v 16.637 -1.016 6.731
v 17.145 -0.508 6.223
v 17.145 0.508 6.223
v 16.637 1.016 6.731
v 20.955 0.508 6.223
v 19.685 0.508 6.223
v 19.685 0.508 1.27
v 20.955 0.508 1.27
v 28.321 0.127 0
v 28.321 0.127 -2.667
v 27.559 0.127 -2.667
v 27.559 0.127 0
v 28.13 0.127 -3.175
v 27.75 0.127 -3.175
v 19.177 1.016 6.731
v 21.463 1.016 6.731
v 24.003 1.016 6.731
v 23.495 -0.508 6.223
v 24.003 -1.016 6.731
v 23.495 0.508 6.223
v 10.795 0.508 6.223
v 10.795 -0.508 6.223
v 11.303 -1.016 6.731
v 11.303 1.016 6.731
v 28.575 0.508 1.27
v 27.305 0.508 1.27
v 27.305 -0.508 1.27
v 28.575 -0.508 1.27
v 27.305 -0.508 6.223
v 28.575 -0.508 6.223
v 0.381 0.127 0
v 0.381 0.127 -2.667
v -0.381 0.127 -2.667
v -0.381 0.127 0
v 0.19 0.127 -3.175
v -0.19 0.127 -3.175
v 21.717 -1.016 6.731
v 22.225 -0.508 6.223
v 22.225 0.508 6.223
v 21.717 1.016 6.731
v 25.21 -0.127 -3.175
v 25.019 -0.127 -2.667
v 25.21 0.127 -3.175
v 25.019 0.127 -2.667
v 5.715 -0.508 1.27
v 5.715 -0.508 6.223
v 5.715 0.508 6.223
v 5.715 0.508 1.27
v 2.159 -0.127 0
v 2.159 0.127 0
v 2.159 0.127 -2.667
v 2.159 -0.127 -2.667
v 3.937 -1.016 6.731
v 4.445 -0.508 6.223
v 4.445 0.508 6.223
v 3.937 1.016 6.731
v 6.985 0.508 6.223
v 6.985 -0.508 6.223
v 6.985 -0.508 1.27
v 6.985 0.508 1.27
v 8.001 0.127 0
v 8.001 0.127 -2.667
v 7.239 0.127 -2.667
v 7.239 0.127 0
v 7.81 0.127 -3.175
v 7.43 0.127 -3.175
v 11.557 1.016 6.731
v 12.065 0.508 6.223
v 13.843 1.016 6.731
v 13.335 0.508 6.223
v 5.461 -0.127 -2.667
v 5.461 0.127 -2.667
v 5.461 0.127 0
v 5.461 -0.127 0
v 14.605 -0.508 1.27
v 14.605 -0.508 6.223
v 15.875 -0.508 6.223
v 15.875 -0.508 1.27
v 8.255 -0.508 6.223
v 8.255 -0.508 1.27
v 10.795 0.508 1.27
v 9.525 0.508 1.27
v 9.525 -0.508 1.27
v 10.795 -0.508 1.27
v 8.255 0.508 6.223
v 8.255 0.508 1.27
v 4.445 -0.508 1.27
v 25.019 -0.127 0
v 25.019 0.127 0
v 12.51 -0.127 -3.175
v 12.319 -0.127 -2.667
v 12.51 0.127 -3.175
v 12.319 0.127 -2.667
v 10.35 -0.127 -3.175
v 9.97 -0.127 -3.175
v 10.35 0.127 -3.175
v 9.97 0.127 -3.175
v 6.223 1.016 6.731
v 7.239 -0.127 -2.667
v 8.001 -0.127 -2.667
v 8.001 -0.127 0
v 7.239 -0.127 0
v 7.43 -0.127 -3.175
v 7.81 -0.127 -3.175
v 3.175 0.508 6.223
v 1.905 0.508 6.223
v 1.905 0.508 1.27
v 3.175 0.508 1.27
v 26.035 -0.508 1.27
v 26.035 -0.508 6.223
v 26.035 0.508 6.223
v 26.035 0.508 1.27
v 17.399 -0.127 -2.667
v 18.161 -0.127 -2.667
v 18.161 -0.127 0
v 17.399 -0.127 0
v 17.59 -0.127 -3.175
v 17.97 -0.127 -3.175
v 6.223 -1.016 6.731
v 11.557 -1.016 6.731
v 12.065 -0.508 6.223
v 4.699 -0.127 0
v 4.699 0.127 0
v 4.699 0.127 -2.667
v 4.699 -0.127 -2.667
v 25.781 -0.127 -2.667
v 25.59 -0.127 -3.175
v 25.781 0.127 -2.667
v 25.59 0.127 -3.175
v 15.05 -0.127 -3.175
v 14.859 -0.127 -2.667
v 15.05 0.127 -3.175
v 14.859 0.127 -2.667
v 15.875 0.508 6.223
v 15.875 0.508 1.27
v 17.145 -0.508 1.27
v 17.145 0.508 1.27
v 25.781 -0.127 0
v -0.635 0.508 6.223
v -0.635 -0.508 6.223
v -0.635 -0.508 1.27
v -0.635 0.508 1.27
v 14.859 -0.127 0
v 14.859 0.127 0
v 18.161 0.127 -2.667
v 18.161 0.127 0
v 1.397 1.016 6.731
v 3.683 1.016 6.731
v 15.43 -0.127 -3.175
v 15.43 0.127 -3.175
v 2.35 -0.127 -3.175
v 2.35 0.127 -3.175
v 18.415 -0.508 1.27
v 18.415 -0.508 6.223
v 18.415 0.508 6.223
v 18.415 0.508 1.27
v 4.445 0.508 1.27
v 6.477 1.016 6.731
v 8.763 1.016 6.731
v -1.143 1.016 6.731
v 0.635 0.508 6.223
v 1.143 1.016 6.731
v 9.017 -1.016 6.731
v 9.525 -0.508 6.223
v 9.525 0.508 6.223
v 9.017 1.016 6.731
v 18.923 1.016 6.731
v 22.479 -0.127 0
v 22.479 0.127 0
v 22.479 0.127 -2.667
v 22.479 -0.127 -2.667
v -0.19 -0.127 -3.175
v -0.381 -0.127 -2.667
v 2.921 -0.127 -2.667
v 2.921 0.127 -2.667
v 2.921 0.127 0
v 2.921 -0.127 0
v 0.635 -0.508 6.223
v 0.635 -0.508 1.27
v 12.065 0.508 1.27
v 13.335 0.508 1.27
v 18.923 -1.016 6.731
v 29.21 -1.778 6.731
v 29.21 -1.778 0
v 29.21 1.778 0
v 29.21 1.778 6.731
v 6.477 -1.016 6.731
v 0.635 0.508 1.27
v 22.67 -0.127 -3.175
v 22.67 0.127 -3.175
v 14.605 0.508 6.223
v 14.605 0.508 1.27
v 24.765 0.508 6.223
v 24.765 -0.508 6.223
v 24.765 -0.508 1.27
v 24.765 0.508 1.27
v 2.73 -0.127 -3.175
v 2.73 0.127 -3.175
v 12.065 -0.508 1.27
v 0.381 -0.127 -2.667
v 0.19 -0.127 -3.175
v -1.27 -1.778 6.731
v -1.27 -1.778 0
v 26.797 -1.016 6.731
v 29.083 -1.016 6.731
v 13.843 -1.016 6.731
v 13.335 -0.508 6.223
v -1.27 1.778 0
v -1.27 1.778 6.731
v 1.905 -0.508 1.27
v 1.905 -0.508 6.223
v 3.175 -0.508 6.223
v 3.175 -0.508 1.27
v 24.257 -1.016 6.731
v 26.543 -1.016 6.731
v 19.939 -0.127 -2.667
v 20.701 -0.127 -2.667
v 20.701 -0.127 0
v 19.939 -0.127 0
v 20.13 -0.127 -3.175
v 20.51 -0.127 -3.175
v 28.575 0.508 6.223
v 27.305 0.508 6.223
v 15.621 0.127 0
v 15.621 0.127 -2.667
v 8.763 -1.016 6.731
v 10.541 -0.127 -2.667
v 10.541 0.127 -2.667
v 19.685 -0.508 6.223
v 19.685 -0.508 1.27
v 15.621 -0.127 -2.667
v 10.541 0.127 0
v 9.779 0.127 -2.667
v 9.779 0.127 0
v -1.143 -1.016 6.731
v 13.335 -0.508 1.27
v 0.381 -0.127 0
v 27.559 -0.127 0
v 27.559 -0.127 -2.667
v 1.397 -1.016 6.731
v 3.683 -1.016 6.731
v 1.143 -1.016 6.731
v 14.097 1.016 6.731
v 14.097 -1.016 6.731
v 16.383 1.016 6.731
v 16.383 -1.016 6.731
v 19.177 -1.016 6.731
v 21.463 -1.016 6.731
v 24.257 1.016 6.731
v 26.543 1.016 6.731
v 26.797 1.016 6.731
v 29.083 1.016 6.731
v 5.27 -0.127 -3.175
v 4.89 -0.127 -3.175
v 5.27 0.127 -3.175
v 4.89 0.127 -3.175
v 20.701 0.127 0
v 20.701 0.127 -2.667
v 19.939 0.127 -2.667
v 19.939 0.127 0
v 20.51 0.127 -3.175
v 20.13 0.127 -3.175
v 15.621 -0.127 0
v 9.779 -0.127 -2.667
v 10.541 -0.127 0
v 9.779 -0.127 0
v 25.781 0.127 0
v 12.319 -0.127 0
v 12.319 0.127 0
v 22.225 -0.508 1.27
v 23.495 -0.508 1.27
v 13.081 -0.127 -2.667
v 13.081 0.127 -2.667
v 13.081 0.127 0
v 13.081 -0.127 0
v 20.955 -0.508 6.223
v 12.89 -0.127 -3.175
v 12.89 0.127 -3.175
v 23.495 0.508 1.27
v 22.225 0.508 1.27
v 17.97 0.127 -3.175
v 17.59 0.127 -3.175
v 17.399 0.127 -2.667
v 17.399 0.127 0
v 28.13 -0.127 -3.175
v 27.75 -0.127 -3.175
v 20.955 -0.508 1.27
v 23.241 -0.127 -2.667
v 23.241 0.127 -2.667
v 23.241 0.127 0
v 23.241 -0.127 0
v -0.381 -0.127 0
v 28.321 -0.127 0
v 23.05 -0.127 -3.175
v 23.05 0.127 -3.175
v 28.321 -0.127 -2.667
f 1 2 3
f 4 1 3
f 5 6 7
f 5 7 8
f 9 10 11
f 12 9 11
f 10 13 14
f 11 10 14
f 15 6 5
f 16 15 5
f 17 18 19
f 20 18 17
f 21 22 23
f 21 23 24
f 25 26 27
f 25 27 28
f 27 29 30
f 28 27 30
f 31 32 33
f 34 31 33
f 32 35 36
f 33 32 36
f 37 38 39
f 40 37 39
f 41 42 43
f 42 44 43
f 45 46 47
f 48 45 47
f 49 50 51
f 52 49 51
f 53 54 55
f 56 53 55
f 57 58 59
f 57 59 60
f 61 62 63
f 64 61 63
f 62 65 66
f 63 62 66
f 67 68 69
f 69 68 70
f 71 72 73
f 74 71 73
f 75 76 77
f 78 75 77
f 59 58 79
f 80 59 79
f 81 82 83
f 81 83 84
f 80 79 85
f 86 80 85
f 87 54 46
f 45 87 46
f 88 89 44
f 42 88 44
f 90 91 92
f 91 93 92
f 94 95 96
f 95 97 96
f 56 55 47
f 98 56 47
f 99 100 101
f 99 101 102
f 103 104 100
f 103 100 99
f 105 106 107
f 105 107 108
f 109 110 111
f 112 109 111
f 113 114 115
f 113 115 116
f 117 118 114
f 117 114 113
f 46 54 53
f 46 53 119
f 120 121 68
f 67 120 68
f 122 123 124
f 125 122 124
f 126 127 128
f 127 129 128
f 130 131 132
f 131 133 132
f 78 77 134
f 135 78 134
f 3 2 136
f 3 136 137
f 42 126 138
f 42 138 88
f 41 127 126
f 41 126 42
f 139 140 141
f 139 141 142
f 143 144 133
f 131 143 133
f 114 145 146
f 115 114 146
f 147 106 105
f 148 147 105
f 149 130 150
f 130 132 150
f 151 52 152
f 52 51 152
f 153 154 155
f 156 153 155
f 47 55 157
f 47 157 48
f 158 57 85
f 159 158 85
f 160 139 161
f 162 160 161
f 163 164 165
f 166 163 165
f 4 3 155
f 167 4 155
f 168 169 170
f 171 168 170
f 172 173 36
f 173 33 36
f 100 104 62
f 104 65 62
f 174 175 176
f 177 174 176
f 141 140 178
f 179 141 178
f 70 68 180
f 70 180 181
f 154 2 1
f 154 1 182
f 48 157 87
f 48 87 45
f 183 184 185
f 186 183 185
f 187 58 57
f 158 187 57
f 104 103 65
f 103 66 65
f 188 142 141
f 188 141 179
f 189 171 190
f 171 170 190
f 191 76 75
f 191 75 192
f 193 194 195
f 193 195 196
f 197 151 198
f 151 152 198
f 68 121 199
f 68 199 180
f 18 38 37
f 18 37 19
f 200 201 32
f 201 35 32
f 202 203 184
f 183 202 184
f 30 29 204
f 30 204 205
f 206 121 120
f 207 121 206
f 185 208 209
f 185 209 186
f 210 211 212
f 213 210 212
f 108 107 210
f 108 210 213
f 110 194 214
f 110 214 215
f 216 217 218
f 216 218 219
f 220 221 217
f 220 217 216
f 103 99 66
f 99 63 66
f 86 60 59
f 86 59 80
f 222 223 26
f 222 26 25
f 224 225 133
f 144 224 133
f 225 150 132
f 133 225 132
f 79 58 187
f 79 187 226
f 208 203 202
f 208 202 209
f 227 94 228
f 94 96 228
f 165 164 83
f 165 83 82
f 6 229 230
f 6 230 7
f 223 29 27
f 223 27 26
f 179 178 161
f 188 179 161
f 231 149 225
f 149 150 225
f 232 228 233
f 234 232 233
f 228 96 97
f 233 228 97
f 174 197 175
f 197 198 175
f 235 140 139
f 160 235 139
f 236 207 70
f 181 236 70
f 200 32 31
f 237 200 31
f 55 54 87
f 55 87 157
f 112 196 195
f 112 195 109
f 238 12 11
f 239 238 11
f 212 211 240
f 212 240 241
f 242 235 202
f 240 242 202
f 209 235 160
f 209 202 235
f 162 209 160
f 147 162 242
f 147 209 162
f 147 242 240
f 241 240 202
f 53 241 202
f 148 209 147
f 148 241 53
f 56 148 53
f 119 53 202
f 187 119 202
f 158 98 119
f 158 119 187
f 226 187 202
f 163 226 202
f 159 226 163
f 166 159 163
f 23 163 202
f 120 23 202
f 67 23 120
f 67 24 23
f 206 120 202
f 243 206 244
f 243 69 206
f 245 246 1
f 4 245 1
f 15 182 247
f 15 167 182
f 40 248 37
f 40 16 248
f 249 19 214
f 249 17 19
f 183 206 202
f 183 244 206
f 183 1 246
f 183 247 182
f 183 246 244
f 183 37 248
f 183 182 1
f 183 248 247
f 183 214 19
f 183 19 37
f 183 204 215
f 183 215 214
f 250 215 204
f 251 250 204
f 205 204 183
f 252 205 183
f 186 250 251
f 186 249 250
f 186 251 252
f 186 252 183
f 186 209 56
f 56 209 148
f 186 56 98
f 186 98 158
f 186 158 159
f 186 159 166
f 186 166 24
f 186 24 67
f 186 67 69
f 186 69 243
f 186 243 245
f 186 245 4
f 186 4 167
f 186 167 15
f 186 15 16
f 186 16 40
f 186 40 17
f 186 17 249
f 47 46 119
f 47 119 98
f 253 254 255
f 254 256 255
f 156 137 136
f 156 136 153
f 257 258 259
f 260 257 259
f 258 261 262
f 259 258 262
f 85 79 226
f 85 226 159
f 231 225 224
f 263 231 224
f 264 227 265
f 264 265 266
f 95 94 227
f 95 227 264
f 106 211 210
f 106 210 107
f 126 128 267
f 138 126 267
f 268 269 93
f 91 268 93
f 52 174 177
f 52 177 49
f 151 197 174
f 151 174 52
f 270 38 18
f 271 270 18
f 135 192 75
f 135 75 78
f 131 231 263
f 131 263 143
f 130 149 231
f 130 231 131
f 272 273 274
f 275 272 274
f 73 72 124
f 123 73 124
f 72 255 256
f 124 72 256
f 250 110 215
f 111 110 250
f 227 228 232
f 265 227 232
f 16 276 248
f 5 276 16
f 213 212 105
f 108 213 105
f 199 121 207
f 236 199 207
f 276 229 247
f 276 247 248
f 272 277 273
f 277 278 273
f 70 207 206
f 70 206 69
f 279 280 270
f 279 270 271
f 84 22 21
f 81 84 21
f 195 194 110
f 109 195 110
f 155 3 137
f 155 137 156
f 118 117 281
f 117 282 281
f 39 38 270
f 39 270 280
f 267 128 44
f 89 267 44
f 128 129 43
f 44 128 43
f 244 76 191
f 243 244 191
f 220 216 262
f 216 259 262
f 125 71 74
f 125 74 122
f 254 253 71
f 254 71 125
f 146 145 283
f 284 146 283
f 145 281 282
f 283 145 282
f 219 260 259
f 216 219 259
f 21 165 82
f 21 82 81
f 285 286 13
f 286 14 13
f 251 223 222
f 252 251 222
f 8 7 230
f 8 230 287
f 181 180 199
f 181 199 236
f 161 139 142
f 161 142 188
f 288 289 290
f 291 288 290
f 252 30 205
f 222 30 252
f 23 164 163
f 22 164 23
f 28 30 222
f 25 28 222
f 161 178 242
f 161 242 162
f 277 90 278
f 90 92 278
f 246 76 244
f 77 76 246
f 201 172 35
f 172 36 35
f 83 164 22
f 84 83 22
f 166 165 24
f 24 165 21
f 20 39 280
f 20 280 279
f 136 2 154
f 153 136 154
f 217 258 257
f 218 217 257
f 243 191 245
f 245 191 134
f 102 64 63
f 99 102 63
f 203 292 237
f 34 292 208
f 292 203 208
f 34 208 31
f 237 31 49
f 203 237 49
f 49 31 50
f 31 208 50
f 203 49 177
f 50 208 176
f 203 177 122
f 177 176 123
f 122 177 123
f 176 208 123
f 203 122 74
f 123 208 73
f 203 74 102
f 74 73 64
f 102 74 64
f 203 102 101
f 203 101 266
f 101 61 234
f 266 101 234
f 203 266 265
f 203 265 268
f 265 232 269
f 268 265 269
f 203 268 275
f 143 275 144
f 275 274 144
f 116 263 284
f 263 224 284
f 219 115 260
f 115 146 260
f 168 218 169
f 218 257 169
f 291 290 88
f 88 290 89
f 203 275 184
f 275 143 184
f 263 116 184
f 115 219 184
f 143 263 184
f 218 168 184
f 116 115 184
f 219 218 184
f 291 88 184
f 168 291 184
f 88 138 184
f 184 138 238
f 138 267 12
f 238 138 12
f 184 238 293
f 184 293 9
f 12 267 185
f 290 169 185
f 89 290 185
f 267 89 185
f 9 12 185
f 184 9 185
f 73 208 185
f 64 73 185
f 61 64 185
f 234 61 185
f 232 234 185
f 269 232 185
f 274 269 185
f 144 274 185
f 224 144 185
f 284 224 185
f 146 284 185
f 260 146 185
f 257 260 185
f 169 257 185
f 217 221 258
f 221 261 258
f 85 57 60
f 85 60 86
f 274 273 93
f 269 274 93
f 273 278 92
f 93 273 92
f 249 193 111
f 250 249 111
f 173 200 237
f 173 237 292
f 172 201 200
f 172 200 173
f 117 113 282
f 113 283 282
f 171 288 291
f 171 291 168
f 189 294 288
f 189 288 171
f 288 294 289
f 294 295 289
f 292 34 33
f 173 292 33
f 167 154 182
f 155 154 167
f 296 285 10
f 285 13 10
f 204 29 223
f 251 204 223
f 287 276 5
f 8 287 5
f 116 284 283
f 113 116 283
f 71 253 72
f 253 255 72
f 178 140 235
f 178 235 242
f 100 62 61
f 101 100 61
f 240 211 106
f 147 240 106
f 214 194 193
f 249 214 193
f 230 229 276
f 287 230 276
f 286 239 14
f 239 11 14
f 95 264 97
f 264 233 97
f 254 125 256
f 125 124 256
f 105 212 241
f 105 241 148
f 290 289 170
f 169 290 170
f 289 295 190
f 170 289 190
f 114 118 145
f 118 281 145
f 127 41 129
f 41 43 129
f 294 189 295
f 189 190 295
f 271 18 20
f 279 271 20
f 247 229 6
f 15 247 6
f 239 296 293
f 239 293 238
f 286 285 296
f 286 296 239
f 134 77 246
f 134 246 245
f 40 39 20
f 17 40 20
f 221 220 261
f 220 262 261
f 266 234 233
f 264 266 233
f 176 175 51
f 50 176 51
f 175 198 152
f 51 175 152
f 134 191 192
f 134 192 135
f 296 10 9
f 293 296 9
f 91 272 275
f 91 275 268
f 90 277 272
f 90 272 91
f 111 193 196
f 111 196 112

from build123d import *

# Parameters (mm, degrees)
SKETCH1_W                  = 2.54
SKETCH1_H                  = 3.556
BOSS_EXTRUDE1_DEPTH        = 6.731
SKETCH2_W                  = 1.27
SKETCH2_H                  = 1.016
CUT_EXTRUDE1_DEPTH         = 5.461
CHAMFER1_SIZE              = 0.508
BOSS_EXTRUDE2_START        = -1.778
BOSS_EXTRUDE2_DEPTH        = 0.127
LPATTERN1_COUNT            = 12
LPATTERN1_PITCH            = 2.54
CHAMFER1_OF_LPATTERN1_SIZE = 0.508


with BuildPart() as part:
    # Sketch1 → Boss-Extrude1 (new body)
    with BuildSketch(Plane.XY):
        Rectangle(SKETCH1_W, SKETCH1_H)
    boss_extrude1 = extrude(amount=BOSS_EXTRUDE1_DEPTH)

    # Sketch2 → Cut-Extrude1 (cut)
    with BuildSketch(Plane.XY.offset(6.731)):
        Rectangle(SKETCH2_W, SKETCH2_H)
    cut_extrude1 = extrude(amount=-CUT_EXTRUDE1_DEPTH, mode=Mode.SUBTRACT)

    # Chamfer1
    chamfer1_edges = [part.edges().sort_by_distance(p)[0] for p in [
        (-0.635, 0, 6.731),
        (0, -0.508, 6.731),
        (0.635, 0, 6.731),
        (0, 0.508, 6.731),
    ]]
    chamfer(chamfer1_edges, length=CHAMFER1_SIZE)

    # Sketch3 → Boss-Extrude2 (add, symmetric)
    with BuildSketch(Plane(origin=(0, 1.778, 0), x_dir=(1, 0, 0), z_dir=(0, 1, 0)).offset(BOSS_EXTRUDE2_START)):
        Polygon((-0.381, 0), (-0.381, 2.667), (-0.1905, 3.175), (0.1905, 3.175), (0.381, 2.667), (0.381, 0), align=None)
    boss_extrude2 = extrude(amount=BOSS_EXTRUDE2_DEPTH, both=True)

    # LPattern1: Boss-Extrude1, Cut-Extrude1, Boss-Extrude2 ×12
    with Locations(*[(i * LPATTERN1_PITCH, 0, 0) for i in range(1, LPATTERN1_COUNT)]):
        add(boss_extrude1)
        add(cut_extrude1, mode=Mode.SUBTRACT)
        add(boss_extrude2)

    # Chamfer1 of LPattern1
    chamfer1_of_lpattern1_edges = [part.edges().sort_by_distance(p)[0] for p in [
        (1.905, 0, 6.731),
        (2.54, -0.508, 6.731),
        (3.175, 0, 6.731),
        (2.54, 0.508, 6.731),
        (4.445, 0, 6.731),
        (5.08, -0.508, 6.731),
        (5.715, 0, 6.731),
        (5.08, 0.508, 6.731),
        (6.985, 0, 6.731),
        (7.62, -0.508, 6.731),
        (8.255, 0, 6.731),
        (7.62, 0.508, 6.731),
        (9.525, 0, 6.731),
        (10.16, -0.508, 6.731),
        (10.795, 0, 6.731),
        (10.16, 0.508, 6.731),
        (12.065, 0, 6.731),
        (12.7, -0.508, 6.731),
        (13.335, 0, 6.731),
        (12.7, 0.508, 6.731),
        (14.605, 0, 6.731),
        (15.24, -0.508, 6.731),
        (15.875, 0, 6.731),
        (15.24, 0.508, 6.731),
        (17.145, 0, 6.731),
        (17.78, -0.508, 6.731),
        (18.415, 0, 6.731),
        (17.78, 0.508, 6.731),
        (19.685, 0, 6.731),
        (20.32, -0.508, 6.731),
        (20.955, 0, 6.731),
        (20.32, 0.508, 6.731),
        (22.225, 0, 6.731),
        (22.86, -0.508, 6.731),
        (23.495, 0, 6.731),
        (22.86, 0.508, 6.731),
        (24.765, 0, 6.731),
        (25.4, -0.508, 6.731),
        (26.035, 0, 6.731),
        (25.4, 0.508, 6.731),
        (27.305, 0, 6.731),
        (27.94, -0.508, 6.731),
        (28.575, 0, 6.731),
        (27.94, 0.508, 6.731),
    ]]
    chamfer(chamfer1_of_lpattern1_edges, length=CHAMFER1_OF_LPATTERN1_SIZE)


solid = part.part
